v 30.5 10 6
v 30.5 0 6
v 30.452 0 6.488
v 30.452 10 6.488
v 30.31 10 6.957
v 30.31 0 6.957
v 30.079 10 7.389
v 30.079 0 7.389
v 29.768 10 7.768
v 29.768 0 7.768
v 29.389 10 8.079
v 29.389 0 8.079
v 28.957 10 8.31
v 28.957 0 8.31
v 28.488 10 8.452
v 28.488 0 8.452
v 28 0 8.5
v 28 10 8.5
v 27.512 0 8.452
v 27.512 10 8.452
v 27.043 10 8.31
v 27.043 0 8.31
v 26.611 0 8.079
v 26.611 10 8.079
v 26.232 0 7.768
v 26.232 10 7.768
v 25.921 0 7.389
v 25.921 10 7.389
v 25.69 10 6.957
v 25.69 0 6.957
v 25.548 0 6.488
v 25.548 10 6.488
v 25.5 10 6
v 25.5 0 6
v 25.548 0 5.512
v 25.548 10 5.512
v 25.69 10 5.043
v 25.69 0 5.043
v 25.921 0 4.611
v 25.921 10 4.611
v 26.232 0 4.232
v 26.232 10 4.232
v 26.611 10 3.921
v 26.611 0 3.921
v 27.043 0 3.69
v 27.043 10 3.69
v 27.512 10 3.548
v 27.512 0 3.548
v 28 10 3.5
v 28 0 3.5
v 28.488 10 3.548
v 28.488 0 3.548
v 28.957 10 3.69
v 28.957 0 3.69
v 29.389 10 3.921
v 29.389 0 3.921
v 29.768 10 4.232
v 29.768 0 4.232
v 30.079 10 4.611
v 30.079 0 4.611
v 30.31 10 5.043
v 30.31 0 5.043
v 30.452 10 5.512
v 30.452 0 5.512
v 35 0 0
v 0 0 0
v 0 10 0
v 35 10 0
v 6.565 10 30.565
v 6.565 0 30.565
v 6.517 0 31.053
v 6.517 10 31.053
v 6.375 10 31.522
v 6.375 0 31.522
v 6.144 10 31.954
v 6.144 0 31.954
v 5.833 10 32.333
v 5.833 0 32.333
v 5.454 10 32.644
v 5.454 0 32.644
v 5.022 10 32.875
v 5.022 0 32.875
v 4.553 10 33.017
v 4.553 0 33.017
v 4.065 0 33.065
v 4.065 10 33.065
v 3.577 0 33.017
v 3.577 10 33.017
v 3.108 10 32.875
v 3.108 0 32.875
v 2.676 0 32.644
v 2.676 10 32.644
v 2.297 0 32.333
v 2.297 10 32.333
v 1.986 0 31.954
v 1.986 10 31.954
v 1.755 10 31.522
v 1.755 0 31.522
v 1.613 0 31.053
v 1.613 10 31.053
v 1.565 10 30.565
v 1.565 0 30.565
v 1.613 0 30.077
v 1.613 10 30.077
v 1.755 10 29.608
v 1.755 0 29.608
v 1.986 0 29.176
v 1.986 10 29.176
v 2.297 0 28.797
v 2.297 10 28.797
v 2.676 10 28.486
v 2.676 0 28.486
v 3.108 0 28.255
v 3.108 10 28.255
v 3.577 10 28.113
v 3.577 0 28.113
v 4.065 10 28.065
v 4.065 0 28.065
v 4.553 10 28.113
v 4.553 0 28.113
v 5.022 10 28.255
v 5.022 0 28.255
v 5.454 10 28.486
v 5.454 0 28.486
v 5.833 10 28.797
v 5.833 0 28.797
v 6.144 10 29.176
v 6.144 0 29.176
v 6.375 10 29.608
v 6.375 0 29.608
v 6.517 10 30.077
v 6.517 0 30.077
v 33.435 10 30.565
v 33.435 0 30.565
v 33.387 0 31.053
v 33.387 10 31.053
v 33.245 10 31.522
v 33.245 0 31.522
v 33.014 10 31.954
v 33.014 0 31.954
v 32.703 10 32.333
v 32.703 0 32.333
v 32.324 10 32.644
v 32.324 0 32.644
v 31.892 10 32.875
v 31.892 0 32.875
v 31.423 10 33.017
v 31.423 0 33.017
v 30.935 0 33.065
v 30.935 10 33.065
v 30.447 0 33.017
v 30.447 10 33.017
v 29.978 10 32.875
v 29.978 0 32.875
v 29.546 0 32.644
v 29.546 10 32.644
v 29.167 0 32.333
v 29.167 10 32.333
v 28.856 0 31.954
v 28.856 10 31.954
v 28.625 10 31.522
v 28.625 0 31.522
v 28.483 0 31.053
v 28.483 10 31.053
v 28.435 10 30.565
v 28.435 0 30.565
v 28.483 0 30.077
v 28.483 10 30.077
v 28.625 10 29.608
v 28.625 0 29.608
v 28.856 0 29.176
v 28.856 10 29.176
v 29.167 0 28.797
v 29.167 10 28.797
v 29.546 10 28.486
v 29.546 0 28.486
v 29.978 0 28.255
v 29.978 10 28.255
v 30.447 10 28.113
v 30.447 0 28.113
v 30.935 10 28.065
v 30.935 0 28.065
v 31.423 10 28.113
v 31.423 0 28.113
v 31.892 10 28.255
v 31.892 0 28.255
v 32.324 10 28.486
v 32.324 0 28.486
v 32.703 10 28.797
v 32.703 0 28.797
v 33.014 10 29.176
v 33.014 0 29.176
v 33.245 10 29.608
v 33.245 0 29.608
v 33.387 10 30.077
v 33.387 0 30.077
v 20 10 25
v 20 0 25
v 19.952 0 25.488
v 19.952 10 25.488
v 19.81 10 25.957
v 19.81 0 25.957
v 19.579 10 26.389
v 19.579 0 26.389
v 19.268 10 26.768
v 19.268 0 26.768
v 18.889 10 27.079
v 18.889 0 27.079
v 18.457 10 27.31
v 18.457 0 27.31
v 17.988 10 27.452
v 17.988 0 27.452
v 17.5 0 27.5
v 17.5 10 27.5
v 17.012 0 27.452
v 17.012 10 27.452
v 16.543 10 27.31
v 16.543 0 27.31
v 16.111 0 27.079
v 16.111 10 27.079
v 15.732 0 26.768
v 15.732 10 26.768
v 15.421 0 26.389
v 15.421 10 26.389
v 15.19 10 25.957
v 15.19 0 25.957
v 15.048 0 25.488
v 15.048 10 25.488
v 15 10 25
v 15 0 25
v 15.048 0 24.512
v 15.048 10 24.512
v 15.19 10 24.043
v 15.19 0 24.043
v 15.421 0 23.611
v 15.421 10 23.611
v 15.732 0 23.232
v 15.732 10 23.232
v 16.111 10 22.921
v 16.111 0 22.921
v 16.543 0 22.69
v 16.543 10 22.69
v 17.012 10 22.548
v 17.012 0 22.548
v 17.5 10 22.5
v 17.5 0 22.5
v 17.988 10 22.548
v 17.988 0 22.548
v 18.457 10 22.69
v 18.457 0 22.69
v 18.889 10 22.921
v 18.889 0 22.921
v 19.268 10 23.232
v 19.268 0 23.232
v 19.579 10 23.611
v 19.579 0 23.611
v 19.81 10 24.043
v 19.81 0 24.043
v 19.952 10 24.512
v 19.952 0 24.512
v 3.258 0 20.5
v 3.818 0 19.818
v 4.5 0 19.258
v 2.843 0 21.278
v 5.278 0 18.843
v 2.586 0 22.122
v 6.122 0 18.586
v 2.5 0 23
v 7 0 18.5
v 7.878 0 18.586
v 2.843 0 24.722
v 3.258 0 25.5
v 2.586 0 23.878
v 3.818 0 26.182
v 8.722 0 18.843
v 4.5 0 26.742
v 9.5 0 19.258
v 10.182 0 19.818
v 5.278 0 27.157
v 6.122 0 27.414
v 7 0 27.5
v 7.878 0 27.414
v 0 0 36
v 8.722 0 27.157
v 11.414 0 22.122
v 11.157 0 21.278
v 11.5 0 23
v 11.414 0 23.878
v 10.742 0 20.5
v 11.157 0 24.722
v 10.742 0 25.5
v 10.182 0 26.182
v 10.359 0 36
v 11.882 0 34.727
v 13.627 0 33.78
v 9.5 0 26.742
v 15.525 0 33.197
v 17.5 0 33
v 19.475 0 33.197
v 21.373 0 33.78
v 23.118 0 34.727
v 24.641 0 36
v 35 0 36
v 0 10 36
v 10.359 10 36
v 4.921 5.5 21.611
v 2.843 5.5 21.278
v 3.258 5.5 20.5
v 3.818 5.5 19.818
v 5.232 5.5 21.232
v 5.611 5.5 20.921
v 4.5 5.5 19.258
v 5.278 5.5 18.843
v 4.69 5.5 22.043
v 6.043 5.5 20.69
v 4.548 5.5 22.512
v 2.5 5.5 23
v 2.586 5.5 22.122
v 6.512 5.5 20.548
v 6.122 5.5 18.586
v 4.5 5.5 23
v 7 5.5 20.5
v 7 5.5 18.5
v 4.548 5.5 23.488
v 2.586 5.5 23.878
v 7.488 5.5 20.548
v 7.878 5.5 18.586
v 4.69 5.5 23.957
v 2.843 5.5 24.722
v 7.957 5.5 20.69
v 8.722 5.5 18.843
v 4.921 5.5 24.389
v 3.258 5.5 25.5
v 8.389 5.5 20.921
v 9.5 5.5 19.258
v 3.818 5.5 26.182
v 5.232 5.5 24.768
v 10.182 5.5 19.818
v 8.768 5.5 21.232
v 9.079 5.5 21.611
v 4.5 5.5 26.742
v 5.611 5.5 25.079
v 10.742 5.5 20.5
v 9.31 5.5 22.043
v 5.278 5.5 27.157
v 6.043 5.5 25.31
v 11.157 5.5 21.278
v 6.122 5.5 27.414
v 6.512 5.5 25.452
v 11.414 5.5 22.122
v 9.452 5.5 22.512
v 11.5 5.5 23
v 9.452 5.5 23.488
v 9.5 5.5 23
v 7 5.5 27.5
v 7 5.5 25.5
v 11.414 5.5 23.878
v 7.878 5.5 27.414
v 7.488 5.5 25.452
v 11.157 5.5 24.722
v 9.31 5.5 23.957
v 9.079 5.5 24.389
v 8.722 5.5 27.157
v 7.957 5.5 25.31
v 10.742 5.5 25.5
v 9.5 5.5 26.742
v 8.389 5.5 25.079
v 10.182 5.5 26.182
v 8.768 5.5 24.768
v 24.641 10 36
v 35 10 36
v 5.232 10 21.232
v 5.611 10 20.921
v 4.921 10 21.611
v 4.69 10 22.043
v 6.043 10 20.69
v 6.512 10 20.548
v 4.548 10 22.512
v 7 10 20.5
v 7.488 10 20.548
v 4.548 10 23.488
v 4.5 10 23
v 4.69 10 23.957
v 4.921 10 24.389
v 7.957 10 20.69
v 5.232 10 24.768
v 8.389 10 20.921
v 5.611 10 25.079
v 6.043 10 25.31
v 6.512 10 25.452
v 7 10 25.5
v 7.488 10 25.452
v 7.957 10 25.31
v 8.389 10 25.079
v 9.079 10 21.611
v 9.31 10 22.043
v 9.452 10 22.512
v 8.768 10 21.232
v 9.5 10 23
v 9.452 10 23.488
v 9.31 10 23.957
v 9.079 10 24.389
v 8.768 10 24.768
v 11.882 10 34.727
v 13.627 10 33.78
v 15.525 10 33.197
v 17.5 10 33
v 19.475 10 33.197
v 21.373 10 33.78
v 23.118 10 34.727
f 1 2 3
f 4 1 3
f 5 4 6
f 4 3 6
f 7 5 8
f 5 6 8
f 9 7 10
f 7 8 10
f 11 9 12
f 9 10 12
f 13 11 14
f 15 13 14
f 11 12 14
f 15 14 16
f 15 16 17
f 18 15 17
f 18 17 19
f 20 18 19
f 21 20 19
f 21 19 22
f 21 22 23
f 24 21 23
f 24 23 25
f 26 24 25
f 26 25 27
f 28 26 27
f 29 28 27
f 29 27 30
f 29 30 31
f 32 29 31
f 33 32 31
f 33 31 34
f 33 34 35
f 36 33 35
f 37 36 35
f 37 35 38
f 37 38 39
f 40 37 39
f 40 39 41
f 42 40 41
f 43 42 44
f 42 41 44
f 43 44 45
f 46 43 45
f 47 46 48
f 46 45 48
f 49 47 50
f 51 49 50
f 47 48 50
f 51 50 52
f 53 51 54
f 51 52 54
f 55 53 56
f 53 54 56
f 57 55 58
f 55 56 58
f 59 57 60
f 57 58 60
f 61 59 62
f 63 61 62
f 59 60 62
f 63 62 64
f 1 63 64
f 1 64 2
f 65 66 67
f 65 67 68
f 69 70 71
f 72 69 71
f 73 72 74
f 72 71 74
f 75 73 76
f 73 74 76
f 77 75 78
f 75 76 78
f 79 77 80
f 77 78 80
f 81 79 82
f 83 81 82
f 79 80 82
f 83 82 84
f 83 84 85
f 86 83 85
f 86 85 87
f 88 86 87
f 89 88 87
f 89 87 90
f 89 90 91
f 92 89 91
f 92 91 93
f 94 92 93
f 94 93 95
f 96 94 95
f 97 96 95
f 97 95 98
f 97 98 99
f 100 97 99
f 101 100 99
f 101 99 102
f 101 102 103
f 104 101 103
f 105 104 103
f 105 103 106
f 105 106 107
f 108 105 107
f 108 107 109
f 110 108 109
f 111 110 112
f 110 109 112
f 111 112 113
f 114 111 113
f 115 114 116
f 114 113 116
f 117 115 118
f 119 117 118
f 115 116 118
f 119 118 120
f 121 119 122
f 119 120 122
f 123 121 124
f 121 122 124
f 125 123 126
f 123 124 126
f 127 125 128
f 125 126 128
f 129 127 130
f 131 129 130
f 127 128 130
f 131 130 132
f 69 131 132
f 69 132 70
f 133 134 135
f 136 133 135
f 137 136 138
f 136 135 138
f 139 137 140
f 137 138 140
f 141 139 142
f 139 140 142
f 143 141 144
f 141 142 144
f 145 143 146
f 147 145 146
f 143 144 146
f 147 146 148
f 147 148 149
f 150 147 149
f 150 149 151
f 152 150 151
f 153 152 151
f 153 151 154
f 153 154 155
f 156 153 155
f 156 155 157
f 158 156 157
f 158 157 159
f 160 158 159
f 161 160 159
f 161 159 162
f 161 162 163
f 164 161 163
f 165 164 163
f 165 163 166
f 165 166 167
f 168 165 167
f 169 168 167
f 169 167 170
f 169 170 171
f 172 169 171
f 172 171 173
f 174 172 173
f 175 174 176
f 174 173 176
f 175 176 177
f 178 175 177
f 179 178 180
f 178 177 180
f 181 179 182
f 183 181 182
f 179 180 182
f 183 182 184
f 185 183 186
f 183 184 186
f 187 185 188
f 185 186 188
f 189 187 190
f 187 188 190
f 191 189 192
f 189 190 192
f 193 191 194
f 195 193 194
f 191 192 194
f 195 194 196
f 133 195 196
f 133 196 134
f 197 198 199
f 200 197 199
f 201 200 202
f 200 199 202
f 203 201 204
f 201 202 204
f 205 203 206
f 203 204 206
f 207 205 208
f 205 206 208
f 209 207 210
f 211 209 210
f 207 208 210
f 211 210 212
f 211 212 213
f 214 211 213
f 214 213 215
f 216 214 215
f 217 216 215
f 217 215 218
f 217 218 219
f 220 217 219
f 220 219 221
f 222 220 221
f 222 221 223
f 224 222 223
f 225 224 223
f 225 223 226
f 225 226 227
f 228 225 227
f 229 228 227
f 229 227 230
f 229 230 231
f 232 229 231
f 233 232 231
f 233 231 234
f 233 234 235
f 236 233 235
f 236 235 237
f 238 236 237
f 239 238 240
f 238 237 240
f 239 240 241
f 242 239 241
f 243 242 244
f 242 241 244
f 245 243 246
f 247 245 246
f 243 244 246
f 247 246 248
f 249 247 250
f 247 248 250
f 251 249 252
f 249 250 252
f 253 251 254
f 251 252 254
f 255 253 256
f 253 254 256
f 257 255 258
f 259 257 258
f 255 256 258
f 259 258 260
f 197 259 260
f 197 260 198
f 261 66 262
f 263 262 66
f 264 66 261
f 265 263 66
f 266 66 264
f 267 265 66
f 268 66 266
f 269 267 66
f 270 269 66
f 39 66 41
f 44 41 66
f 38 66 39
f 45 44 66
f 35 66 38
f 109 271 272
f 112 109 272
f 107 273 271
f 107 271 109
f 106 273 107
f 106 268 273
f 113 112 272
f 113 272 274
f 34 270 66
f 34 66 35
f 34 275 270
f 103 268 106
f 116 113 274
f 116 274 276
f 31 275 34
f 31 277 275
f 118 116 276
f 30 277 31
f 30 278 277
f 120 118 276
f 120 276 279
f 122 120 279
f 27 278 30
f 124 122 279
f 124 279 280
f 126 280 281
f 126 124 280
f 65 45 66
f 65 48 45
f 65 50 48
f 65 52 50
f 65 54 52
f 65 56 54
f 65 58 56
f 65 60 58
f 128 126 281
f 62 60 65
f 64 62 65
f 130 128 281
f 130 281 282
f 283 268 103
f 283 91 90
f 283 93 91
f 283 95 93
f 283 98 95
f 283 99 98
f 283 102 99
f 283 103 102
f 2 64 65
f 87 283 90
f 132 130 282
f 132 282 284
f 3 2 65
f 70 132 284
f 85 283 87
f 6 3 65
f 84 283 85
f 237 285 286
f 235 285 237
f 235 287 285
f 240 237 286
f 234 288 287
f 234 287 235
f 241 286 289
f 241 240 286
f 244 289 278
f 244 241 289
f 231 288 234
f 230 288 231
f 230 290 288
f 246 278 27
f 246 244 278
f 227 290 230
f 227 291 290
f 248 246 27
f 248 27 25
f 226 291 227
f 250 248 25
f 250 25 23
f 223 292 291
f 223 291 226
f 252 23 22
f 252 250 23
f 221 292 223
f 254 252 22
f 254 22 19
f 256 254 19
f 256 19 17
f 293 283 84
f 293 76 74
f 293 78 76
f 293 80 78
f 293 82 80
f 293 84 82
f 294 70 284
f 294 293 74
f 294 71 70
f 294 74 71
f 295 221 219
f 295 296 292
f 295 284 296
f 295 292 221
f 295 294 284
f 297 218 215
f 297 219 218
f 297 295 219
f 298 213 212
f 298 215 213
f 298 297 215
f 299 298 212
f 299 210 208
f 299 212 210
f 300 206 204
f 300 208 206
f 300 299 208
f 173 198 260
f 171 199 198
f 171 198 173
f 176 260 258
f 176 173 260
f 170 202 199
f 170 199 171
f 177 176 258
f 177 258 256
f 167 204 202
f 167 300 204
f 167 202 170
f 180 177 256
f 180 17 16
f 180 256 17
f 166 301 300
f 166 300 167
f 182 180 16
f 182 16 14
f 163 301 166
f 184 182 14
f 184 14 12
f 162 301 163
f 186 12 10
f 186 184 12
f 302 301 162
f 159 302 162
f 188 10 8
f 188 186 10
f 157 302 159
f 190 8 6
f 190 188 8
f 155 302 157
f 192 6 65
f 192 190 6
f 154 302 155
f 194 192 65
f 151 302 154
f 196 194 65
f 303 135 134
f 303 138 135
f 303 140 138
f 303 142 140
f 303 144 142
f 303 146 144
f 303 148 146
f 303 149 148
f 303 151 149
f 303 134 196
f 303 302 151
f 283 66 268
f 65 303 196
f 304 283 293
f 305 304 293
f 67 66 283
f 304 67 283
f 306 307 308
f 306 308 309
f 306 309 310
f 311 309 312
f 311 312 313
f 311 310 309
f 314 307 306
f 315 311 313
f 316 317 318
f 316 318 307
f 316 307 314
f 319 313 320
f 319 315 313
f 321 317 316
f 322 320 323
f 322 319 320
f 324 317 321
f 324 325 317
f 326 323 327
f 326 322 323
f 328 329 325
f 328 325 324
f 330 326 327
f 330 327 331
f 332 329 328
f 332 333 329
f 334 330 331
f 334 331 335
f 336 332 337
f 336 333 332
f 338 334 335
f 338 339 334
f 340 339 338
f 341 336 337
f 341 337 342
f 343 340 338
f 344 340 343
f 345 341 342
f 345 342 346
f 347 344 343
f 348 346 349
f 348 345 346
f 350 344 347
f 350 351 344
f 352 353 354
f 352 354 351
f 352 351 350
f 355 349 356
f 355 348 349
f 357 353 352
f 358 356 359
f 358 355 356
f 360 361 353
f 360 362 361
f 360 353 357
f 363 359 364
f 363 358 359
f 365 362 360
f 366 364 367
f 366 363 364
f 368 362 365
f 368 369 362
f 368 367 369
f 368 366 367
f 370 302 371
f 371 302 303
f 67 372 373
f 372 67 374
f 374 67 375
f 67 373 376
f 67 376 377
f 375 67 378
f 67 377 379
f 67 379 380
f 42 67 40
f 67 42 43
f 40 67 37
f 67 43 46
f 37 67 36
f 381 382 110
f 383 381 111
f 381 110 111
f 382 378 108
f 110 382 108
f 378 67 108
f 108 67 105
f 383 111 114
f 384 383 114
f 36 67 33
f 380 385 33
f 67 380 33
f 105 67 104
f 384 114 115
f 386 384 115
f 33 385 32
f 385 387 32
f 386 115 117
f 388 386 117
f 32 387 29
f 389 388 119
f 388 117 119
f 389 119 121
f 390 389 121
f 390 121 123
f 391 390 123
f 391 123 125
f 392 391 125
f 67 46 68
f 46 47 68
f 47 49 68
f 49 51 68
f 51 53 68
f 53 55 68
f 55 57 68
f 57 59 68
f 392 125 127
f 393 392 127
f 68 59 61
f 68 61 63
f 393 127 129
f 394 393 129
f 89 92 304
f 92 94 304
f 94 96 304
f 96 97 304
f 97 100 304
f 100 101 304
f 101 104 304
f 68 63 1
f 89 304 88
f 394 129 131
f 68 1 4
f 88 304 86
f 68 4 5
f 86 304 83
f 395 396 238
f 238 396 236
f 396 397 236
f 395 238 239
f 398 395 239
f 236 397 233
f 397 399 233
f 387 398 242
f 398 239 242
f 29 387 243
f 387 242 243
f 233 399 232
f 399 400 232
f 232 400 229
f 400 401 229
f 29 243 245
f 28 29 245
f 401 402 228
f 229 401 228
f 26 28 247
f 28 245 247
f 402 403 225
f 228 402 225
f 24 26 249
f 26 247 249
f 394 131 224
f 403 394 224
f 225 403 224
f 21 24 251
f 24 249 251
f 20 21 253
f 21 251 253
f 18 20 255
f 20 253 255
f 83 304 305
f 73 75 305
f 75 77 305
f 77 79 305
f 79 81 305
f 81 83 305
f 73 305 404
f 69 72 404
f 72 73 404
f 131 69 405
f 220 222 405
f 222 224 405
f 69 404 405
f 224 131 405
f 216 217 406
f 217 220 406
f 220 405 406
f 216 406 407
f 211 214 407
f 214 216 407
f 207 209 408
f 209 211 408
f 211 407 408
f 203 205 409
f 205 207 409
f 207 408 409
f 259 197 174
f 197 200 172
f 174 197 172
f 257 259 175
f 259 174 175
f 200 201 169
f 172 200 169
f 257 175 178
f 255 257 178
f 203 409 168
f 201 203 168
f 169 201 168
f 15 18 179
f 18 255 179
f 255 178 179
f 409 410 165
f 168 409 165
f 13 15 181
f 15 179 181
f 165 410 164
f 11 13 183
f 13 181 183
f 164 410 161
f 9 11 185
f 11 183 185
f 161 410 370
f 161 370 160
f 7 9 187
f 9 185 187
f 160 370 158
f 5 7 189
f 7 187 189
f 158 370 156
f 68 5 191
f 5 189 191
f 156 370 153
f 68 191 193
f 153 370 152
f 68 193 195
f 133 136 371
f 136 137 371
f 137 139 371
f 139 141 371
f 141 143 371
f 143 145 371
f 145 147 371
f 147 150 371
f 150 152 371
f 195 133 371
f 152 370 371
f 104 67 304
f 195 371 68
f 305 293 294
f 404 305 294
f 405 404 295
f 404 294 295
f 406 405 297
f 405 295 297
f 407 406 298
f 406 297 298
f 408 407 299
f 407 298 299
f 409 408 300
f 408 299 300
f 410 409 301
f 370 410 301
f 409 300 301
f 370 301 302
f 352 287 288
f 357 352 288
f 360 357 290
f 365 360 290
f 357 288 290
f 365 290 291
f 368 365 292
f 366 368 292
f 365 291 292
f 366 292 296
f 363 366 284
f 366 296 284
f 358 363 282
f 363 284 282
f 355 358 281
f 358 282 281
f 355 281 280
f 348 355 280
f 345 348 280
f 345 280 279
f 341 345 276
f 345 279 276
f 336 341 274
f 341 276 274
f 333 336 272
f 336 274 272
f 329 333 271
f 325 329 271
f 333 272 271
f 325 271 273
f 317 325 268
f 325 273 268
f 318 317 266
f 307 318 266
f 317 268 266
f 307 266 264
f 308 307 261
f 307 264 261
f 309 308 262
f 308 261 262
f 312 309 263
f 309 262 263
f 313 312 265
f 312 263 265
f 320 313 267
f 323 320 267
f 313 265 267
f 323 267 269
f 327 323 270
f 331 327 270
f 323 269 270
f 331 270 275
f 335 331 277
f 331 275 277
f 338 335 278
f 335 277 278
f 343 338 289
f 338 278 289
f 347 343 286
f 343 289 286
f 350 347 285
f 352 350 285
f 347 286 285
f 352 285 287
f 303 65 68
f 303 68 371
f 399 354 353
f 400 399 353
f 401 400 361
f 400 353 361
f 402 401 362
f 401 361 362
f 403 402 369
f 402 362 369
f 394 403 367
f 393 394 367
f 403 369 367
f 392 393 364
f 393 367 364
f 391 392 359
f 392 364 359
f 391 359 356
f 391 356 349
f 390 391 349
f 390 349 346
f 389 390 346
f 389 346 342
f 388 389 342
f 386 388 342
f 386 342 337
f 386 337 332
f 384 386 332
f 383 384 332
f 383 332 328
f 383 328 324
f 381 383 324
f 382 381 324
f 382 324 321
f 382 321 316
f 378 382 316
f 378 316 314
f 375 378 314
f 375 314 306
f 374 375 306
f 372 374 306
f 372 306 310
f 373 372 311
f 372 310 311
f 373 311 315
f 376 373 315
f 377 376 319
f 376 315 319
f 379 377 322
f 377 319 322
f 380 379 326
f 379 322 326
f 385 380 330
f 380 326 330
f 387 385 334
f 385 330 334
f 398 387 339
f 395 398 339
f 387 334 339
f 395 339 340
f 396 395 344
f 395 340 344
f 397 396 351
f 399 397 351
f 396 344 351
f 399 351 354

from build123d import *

# Parameters (mm, degrees)
F0_W     = 35
F0_H     = 50
F1_DEPTH = 10
F2_R     = 2.5
F3_DEPTH = 10.001
F4_R     = 2.5
F5_DEPTH = 25
F7_DEPTH = 25
F8_R     = 4.5
F9_DEPTH = 5.5


with BuildPart() as f1:
    # F0 (on Front) → F1 (new body)
    with BuildSketch(Plane.XZ):
        with Locations((17.5, 25)):
            Rectangle(F0_W, F0_H)
    extrude(amount=-F1_DEPTH)

    # F2 (on face) → F3 (cut, through all)
    with BuildSketch(Plane.XZ):
        with Locations((28, 6)):
            Circle(F2_R)
        with Locations((7, 23)):
            Circle(F2_R)
    extrude(amount=-F3_DEPTH, mode=Mode.SUBTRACT)

    # F4 (on face) → F5 (cut)
    with BuildSketch(Plane.XZ):
        with Locations((17.5, 25)):
            Circle(F4_R)
        with Locations((4.064971, 30.564971)):
            Circle(F4_R)
        with Locations((30.935029, 30.564971)):
            Circle(F4_R)
    extrude(amount=-F5_DEPTH, mode=Mode.SUBTRACT)

    # F6 (on face) → F7 (cut)
    with BuildSketch(Plane.XZ):
        with BuildLine():
            Line((0, 36), (10.358572, 36))
            ThreePointArc((10.358572, 36), (17.5, 33), (24.641428, 36))
            Line((24.641428, 36), (35, 36))
            Line((35, 36), (35, 50))
            Line((35, 50), (0, 50))
            Line((0, 50), (0, 36))
        make_face()
    extrude(amount=-F7_DEPTH, mode=Mode.SUBTRACT)

    # F8 (on face) → F9 (cut)
    with BuildSketch(Plane.XZ):
        with Locations((7, 23)):
            Circle(F8_R)
    extrude(amount=-F9_DEPTH, mode=Mode.SUBTRACT)


solid = f1.part
